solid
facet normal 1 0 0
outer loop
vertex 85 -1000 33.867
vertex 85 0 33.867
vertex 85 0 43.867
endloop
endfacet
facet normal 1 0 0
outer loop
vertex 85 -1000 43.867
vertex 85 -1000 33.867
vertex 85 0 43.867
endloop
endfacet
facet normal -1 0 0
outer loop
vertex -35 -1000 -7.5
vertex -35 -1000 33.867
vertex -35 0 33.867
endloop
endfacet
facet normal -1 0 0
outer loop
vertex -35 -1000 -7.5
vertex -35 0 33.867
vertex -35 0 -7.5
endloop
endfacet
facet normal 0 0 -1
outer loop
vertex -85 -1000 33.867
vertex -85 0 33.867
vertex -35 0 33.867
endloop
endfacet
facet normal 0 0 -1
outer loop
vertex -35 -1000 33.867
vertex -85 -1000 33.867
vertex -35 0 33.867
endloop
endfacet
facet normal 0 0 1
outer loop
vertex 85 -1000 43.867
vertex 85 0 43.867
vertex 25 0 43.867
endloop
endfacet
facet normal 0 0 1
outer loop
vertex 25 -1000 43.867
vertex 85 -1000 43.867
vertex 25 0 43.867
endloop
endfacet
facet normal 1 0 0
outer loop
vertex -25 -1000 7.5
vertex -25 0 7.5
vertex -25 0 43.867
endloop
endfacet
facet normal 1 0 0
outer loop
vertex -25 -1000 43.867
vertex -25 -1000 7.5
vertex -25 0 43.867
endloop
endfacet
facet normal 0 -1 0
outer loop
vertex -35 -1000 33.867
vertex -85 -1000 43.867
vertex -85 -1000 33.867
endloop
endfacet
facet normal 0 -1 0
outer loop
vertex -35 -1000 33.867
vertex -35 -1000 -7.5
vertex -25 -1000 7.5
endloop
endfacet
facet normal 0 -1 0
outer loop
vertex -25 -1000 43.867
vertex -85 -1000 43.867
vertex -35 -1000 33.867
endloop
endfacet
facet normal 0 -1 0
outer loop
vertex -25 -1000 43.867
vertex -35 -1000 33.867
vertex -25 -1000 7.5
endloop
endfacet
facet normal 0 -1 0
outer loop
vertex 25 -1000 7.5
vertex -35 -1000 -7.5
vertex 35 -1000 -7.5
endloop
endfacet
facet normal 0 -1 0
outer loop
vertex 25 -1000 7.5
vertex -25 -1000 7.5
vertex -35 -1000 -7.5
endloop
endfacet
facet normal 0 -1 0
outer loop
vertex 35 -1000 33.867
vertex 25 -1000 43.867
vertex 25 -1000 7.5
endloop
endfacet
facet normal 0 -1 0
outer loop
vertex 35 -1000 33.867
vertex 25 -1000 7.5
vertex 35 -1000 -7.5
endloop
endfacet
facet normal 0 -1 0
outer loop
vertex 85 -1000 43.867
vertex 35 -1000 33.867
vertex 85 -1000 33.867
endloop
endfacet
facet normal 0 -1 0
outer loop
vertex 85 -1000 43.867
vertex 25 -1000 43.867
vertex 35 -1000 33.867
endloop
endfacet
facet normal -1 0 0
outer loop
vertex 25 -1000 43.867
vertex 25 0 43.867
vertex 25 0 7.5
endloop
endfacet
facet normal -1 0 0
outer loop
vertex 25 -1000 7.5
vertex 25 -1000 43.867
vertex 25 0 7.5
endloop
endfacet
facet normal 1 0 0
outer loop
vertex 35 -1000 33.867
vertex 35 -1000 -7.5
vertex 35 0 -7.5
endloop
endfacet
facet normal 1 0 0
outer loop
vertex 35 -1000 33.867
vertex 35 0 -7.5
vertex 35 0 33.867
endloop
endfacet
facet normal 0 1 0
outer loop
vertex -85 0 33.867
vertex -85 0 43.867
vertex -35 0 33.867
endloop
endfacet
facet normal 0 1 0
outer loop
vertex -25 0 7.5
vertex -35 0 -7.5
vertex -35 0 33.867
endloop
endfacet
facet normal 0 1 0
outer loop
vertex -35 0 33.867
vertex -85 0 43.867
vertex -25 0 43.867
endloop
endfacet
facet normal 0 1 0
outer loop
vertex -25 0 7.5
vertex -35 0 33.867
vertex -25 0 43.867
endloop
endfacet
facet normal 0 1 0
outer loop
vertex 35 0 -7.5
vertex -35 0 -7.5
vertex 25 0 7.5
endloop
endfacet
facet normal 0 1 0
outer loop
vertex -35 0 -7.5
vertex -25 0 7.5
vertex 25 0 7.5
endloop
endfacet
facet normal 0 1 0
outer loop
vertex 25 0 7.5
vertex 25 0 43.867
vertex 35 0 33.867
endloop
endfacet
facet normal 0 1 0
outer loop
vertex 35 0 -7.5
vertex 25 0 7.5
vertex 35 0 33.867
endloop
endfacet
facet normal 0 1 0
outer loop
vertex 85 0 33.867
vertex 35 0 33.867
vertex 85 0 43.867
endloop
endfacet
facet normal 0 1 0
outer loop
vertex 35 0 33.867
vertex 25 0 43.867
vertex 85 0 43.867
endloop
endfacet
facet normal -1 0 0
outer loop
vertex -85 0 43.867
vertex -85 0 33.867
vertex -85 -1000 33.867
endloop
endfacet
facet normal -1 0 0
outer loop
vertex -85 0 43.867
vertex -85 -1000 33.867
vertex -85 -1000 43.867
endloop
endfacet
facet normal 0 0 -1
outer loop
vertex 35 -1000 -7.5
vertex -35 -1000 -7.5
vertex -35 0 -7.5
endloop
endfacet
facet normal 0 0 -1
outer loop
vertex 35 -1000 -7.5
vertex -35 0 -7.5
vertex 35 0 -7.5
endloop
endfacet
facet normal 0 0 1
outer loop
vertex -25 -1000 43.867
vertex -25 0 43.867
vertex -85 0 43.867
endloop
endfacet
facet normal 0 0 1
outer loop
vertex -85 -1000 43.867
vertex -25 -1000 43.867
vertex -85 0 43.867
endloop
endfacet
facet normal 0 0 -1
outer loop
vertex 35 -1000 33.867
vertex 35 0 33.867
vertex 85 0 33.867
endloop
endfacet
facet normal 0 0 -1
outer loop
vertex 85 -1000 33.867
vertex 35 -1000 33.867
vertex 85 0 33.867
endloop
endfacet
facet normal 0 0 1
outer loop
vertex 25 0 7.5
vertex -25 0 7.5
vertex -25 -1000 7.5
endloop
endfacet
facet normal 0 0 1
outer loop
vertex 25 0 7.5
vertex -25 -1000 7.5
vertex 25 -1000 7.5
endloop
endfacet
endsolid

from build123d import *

# Parameters (mm, degrees)
F0_W     = 50
F0_H     = 10
F0_H_2   = 15
F1_DEPTH = 1000


with BuildPart() as f1:
    # F0 (on Front) → F1 (new body)
    with BuildSketch(Plane.XZ):
        with Locations((-60, 38.86711)):
            Rectangle(F0_W, F0_H)
        Polygon((-25, 43.86711), (-35, 43.86711), (-35, 33.86711), (-35, -7.5), (-25, -7.5), (-25, 7.5), align=None)
        Rectangle(F0_W, F0_H_2)
        Polygon((25, 43.86711), (25, 7.5), (25, -7.5), (35, -7.5), (35, 33.86711), (35, 43.86711), align=None)
        with Locations((60, 38.86711)):
            Rectangle(F0_W, F0_H)
    extrude(amount=F1_DEPTH)


solid = f1.part
